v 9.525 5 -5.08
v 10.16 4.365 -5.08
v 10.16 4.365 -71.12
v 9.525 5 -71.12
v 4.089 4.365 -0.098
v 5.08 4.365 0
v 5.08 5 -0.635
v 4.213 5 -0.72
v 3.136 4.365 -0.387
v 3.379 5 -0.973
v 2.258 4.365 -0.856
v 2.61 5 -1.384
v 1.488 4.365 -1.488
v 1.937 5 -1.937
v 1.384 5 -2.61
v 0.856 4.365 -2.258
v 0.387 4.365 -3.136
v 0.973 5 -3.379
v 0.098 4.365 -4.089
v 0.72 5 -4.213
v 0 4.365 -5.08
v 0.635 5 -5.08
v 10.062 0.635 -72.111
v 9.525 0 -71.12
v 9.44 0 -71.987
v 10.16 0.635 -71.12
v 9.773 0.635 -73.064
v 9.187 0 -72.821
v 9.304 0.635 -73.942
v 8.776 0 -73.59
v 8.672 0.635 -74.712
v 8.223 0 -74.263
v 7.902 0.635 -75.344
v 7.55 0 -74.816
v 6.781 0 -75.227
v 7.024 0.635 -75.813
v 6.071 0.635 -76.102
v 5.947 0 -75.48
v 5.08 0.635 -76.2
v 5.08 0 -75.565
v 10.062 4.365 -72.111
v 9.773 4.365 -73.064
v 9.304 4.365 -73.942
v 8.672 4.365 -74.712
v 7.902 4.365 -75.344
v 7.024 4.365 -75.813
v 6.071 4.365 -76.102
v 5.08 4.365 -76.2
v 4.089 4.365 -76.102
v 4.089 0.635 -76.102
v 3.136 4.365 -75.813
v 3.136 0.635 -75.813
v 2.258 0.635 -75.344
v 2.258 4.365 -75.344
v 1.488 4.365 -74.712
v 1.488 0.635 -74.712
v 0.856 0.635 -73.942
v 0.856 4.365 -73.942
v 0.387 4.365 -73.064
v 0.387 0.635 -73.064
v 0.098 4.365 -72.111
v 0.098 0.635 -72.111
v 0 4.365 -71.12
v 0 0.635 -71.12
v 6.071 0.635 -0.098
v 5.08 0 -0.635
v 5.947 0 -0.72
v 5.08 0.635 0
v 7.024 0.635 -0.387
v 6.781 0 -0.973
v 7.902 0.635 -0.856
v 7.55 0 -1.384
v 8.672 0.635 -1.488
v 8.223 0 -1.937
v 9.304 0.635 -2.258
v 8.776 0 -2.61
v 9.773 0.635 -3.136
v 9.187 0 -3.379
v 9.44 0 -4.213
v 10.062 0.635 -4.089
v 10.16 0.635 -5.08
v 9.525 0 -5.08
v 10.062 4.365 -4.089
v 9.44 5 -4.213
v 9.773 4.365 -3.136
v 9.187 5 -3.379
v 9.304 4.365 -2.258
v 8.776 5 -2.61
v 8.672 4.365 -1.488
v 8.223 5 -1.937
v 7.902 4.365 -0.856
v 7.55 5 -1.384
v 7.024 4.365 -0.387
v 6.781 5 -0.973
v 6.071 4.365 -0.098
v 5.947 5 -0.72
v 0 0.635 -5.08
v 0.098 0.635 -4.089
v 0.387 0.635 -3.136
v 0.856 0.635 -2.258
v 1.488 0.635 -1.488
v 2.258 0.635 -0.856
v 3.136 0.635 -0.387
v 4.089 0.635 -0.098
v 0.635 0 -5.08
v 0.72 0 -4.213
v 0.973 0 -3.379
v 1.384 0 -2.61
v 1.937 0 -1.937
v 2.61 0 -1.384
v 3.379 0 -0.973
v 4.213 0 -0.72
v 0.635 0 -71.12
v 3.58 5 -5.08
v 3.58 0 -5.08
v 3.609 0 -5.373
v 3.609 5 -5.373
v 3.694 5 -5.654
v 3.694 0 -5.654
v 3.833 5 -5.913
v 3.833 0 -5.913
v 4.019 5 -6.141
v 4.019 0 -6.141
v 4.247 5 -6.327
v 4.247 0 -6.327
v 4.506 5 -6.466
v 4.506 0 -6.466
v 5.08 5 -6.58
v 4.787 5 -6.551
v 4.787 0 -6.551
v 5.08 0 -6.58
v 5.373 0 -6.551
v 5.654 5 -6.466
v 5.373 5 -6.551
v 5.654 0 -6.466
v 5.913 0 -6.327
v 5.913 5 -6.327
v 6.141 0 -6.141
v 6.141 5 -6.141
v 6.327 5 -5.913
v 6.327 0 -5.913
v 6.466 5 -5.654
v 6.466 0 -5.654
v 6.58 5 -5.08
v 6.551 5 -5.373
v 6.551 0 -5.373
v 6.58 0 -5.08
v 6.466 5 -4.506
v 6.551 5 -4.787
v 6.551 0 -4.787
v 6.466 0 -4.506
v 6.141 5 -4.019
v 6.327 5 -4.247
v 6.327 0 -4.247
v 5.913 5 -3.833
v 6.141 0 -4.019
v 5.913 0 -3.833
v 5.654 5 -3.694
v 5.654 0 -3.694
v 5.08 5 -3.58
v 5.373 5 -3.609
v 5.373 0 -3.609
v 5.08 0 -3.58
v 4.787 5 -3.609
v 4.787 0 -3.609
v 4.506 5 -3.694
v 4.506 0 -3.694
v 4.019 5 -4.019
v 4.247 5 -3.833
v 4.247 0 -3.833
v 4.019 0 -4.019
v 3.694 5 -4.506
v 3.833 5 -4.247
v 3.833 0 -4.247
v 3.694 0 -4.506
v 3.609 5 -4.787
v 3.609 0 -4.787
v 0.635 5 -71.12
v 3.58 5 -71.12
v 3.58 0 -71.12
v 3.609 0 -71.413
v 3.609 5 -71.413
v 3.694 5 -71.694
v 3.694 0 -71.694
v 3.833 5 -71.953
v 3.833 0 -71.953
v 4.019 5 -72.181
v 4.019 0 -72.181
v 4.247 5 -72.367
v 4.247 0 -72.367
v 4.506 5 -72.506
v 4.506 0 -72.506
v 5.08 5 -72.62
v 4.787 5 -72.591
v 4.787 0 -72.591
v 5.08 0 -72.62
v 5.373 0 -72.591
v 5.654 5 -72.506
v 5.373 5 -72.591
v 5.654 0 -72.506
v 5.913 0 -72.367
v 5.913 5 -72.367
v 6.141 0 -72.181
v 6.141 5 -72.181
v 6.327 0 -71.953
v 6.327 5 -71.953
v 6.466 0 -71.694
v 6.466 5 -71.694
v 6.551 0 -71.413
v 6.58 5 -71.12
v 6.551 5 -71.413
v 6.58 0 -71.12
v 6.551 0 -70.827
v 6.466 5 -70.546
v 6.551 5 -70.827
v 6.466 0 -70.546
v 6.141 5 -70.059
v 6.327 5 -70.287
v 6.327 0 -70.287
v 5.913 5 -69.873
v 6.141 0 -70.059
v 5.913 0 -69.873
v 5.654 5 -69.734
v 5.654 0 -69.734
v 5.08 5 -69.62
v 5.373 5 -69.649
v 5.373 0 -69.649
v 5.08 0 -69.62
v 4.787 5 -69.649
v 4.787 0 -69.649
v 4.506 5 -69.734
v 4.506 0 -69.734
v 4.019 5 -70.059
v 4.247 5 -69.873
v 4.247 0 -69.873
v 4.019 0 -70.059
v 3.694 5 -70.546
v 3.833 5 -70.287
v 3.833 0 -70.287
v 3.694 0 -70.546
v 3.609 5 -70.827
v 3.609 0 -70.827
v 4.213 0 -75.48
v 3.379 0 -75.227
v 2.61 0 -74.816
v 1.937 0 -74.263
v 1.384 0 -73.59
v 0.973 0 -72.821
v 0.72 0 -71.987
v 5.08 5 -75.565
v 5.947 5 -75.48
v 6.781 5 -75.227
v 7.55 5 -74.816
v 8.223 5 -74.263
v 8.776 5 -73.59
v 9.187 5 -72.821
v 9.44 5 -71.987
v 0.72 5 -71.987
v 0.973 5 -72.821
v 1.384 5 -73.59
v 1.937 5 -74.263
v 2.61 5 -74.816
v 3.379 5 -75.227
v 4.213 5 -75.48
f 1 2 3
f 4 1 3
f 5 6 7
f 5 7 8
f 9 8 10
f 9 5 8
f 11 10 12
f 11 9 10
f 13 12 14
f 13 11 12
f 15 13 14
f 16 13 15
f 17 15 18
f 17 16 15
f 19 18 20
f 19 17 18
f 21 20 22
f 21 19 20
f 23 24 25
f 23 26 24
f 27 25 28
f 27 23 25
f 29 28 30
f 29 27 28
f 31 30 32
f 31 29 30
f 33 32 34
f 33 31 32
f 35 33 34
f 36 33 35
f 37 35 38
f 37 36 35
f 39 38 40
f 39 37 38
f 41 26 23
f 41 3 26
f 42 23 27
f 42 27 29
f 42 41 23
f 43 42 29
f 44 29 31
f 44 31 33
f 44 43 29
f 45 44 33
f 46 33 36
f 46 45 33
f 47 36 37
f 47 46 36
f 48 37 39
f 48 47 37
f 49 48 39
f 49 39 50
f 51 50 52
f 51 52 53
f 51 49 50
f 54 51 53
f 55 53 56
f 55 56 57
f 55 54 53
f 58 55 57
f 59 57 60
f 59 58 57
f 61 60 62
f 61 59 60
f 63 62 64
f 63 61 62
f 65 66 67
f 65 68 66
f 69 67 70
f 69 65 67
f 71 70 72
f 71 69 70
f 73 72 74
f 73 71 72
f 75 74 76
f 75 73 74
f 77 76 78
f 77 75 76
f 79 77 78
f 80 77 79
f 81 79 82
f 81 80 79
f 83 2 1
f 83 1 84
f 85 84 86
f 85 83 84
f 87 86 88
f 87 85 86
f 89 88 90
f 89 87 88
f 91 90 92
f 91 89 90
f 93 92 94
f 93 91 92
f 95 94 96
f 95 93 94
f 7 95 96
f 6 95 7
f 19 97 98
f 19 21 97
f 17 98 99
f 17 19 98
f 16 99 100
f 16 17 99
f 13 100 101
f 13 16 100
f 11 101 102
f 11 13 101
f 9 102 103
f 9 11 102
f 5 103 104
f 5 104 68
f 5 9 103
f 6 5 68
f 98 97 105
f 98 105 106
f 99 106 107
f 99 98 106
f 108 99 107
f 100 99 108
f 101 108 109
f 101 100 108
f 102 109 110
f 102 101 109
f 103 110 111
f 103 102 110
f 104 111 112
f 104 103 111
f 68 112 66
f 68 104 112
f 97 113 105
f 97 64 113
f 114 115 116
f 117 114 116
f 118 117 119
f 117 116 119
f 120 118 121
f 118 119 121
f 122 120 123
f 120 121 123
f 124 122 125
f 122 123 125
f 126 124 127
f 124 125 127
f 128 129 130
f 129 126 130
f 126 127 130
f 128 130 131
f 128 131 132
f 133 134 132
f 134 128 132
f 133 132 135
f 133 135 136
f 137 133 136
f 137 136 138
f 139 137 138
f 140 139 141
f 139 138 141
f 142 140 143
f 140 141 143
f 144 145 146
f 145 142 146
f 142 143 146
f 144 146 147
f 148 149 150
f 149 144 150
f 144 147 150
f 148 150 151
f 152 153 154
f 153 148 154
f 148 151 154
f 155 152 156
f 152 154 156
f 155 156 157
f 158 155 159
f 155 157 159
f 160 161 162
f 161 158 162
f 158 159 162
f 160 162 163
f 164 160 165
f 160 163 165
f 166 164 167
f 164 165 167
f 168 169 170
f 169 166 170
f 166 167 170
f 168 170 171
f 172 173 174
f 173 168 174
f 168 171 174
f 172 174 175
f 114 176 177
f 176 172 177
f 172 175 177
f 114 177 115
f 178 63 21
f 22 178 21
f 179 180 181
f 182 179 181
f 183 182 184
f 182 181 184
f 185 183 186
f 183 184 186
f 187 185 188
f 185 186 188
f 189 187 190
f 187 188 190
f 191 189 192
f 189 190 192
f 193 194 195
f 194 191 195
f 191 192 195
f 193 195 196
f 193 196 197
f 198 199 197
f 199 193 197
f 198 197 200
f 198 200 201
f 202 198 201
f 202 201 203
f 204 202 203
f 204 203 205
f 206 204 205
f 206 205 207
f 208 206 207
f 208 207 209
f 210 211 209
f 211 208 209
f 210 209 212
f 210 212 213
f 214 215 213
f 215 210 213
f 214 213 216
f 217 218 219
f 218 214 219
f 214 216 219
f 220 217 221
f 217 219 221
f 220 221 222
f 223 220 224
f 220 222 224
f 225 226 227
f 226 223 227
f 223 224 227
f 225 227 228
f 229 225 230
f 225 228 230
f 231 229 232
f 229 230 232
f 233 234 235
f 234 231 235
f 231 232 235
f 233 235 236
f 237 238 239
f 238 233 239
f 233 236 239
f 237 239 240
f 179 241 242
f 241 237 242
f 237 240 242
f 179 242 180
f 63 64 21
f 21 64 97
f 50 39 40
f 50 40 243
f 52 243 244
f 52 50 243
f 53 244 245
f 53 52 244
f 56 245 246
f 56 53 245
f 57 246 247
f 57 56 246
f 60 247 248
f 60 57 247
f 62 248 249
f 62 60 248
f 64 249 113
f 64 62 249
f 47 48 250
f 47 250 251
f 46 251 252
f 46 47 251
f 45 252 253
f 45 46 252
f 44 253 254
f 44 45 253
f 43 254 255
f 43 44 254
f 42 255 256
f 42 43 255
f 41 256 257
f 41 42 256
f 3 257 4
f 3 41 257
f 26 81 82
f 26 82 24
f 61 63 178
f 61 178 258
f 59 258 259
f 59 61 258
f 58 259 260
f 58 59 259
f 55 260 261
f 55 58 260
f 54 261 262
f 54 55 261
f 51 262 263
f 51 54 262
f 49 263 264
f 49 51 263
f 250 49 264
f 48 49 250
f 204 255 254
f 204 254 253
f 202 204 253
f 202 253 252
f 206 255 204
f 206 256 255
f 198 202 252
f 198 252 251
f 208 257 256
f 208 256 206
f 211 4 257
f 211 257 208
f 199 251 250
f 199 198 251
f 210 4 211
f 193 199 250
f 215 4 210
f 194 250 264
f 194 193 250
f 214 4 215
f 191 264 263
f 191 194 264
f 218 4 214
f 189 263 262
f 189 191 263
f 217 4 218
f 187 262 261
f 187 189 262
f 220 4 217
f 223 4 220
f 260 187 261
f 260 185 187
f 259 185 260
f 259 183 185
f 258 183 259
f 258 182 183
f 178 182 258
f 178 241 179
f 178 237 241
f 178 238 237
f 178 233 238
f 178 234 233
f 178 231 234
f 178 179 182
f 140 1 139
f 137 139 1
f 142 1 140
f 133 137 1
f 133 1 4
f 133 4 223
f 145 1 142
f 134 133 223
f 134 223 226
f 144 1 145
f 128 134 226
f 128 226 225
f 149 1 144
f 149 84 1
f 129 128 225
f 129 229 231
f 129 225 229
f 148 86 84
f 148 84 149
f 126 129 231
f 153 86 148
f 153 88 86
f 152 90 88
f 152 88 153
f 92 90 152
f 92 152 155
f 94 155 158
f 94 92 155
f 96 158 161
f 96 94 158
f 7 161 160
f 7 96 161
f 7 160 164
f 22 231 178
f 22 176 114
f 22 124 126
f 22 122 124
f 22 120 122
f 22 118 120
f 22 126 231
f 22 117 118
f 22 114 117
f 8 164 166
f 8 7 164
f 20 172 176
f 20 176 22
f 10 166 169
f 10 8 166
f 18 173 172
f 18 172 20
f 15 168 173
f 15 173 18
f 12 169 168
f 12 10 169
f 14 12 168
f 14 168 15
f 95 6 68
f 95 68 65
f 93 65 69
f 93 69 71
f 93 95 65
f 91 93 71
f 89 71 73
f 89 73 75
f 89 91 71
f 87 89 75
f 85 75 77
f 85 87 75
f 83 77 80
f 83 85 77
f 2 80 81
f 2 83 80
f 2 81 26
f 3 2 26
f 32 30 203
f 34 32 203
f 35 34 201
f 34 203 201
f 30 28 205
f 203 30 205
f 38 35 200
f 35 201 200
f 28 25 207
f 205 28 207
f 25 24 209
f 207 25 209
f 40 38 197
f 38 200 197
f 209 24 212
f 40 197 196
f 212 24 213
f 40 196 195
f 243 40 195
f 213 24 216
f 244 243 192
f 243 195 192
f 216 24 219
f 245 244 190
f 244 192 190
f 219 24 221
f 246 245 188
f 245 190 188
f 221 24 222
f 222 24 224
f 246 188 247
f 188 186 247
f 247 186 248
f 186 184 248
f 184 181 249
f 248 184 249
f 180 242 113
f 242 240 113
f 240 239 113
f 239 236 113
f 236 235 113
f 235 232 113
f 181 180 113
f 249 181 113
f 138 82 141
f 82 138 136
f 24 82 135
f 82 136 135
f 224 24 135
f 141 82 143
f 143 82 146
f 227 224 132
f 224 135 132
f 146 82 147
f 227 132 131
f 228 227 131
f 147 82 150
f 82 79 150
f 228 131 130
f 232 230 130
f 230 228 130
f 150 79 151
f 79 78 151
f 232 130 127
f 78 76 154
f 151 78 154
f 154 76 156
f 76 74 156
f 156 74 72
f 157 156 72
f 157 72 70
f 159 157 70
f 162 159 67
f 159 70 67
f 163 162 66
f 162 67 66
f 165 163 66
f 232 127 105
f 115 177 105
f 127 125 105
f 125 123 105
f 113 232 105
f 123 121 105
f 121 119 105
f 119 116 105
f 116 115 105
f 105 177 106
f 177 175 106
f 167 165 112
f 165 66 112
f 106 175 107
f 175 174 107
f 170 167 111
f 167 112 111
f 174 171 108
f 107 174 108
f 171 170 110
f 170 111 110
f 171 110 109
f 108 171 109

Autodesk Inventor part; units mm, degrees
ref_plane "YZ Plane" through (0, 0, 0) normal (1, 0, 0) x (0, 1, 0)
ref_plane "XZ Plane" through (0, 0, 0) normal (0, 1, 0) x (-1, 0, 0)
ref_plane "XY Plane" through (0, 0, 0) normal (0, 0, 1) x (1, 0, 0)
sketch "Sketch1" plane through (0, 0, 0) normal (0, 1, 0) x (-1, 0, 0)
  line L0 (0, 0) -> (-10.16, 0)
  line L1 (-10.16, 0) -> (-10.16, -76.2)
  line L2 (-10.16, -76.2) -> (0, -76.2)
  line L3 (0, -76.2) -> (0, 0)
  line L4 (-5.08, -76.2) -> (-5.08, 0) construction
  circle A0 centre (-5.08, -71.12) radius 1.5
  circle A1 centre (-5.08, -5.08) radius 1.5
  dimension "d0" = 10.16
  dimension "d1" = 76.2
  dimension "d2" = 3
  dimension "d3" = 3
  dimension "d4" = 5.08
  dimension "d5" = 5.08
extrude "Extrusion1" add sketch "Sketch1" along normal blind 5
fillet "Fillet1" radius 5.08 4 edges at (10.16, 2.5, 0) (0, 2.5, 0) (10.16, 2.5, -76.2) (0, 2.5, -76.2)
chamfer "Chamfer1" distance 0.635 angle 45 12 edges at (10.16, 5, -38.1) (8.6721, 5, -74.7121) (8.6721, 5, -1.4879) (0, 5, -38.1) (1.4879, 5, -1.4879) (1.4879, 5, -74.7121) (10.16, 0, -38.1) (8.6721, 0, -74.7121) (8.6721, 0, -1.4879) (1.4879, 0, -1.4879) (0, 0, -38.1) (1.4879, 0, -74.7121)
equation "\"d4\" = 0.5 * d0"
equation "\"d5\" = d4"
